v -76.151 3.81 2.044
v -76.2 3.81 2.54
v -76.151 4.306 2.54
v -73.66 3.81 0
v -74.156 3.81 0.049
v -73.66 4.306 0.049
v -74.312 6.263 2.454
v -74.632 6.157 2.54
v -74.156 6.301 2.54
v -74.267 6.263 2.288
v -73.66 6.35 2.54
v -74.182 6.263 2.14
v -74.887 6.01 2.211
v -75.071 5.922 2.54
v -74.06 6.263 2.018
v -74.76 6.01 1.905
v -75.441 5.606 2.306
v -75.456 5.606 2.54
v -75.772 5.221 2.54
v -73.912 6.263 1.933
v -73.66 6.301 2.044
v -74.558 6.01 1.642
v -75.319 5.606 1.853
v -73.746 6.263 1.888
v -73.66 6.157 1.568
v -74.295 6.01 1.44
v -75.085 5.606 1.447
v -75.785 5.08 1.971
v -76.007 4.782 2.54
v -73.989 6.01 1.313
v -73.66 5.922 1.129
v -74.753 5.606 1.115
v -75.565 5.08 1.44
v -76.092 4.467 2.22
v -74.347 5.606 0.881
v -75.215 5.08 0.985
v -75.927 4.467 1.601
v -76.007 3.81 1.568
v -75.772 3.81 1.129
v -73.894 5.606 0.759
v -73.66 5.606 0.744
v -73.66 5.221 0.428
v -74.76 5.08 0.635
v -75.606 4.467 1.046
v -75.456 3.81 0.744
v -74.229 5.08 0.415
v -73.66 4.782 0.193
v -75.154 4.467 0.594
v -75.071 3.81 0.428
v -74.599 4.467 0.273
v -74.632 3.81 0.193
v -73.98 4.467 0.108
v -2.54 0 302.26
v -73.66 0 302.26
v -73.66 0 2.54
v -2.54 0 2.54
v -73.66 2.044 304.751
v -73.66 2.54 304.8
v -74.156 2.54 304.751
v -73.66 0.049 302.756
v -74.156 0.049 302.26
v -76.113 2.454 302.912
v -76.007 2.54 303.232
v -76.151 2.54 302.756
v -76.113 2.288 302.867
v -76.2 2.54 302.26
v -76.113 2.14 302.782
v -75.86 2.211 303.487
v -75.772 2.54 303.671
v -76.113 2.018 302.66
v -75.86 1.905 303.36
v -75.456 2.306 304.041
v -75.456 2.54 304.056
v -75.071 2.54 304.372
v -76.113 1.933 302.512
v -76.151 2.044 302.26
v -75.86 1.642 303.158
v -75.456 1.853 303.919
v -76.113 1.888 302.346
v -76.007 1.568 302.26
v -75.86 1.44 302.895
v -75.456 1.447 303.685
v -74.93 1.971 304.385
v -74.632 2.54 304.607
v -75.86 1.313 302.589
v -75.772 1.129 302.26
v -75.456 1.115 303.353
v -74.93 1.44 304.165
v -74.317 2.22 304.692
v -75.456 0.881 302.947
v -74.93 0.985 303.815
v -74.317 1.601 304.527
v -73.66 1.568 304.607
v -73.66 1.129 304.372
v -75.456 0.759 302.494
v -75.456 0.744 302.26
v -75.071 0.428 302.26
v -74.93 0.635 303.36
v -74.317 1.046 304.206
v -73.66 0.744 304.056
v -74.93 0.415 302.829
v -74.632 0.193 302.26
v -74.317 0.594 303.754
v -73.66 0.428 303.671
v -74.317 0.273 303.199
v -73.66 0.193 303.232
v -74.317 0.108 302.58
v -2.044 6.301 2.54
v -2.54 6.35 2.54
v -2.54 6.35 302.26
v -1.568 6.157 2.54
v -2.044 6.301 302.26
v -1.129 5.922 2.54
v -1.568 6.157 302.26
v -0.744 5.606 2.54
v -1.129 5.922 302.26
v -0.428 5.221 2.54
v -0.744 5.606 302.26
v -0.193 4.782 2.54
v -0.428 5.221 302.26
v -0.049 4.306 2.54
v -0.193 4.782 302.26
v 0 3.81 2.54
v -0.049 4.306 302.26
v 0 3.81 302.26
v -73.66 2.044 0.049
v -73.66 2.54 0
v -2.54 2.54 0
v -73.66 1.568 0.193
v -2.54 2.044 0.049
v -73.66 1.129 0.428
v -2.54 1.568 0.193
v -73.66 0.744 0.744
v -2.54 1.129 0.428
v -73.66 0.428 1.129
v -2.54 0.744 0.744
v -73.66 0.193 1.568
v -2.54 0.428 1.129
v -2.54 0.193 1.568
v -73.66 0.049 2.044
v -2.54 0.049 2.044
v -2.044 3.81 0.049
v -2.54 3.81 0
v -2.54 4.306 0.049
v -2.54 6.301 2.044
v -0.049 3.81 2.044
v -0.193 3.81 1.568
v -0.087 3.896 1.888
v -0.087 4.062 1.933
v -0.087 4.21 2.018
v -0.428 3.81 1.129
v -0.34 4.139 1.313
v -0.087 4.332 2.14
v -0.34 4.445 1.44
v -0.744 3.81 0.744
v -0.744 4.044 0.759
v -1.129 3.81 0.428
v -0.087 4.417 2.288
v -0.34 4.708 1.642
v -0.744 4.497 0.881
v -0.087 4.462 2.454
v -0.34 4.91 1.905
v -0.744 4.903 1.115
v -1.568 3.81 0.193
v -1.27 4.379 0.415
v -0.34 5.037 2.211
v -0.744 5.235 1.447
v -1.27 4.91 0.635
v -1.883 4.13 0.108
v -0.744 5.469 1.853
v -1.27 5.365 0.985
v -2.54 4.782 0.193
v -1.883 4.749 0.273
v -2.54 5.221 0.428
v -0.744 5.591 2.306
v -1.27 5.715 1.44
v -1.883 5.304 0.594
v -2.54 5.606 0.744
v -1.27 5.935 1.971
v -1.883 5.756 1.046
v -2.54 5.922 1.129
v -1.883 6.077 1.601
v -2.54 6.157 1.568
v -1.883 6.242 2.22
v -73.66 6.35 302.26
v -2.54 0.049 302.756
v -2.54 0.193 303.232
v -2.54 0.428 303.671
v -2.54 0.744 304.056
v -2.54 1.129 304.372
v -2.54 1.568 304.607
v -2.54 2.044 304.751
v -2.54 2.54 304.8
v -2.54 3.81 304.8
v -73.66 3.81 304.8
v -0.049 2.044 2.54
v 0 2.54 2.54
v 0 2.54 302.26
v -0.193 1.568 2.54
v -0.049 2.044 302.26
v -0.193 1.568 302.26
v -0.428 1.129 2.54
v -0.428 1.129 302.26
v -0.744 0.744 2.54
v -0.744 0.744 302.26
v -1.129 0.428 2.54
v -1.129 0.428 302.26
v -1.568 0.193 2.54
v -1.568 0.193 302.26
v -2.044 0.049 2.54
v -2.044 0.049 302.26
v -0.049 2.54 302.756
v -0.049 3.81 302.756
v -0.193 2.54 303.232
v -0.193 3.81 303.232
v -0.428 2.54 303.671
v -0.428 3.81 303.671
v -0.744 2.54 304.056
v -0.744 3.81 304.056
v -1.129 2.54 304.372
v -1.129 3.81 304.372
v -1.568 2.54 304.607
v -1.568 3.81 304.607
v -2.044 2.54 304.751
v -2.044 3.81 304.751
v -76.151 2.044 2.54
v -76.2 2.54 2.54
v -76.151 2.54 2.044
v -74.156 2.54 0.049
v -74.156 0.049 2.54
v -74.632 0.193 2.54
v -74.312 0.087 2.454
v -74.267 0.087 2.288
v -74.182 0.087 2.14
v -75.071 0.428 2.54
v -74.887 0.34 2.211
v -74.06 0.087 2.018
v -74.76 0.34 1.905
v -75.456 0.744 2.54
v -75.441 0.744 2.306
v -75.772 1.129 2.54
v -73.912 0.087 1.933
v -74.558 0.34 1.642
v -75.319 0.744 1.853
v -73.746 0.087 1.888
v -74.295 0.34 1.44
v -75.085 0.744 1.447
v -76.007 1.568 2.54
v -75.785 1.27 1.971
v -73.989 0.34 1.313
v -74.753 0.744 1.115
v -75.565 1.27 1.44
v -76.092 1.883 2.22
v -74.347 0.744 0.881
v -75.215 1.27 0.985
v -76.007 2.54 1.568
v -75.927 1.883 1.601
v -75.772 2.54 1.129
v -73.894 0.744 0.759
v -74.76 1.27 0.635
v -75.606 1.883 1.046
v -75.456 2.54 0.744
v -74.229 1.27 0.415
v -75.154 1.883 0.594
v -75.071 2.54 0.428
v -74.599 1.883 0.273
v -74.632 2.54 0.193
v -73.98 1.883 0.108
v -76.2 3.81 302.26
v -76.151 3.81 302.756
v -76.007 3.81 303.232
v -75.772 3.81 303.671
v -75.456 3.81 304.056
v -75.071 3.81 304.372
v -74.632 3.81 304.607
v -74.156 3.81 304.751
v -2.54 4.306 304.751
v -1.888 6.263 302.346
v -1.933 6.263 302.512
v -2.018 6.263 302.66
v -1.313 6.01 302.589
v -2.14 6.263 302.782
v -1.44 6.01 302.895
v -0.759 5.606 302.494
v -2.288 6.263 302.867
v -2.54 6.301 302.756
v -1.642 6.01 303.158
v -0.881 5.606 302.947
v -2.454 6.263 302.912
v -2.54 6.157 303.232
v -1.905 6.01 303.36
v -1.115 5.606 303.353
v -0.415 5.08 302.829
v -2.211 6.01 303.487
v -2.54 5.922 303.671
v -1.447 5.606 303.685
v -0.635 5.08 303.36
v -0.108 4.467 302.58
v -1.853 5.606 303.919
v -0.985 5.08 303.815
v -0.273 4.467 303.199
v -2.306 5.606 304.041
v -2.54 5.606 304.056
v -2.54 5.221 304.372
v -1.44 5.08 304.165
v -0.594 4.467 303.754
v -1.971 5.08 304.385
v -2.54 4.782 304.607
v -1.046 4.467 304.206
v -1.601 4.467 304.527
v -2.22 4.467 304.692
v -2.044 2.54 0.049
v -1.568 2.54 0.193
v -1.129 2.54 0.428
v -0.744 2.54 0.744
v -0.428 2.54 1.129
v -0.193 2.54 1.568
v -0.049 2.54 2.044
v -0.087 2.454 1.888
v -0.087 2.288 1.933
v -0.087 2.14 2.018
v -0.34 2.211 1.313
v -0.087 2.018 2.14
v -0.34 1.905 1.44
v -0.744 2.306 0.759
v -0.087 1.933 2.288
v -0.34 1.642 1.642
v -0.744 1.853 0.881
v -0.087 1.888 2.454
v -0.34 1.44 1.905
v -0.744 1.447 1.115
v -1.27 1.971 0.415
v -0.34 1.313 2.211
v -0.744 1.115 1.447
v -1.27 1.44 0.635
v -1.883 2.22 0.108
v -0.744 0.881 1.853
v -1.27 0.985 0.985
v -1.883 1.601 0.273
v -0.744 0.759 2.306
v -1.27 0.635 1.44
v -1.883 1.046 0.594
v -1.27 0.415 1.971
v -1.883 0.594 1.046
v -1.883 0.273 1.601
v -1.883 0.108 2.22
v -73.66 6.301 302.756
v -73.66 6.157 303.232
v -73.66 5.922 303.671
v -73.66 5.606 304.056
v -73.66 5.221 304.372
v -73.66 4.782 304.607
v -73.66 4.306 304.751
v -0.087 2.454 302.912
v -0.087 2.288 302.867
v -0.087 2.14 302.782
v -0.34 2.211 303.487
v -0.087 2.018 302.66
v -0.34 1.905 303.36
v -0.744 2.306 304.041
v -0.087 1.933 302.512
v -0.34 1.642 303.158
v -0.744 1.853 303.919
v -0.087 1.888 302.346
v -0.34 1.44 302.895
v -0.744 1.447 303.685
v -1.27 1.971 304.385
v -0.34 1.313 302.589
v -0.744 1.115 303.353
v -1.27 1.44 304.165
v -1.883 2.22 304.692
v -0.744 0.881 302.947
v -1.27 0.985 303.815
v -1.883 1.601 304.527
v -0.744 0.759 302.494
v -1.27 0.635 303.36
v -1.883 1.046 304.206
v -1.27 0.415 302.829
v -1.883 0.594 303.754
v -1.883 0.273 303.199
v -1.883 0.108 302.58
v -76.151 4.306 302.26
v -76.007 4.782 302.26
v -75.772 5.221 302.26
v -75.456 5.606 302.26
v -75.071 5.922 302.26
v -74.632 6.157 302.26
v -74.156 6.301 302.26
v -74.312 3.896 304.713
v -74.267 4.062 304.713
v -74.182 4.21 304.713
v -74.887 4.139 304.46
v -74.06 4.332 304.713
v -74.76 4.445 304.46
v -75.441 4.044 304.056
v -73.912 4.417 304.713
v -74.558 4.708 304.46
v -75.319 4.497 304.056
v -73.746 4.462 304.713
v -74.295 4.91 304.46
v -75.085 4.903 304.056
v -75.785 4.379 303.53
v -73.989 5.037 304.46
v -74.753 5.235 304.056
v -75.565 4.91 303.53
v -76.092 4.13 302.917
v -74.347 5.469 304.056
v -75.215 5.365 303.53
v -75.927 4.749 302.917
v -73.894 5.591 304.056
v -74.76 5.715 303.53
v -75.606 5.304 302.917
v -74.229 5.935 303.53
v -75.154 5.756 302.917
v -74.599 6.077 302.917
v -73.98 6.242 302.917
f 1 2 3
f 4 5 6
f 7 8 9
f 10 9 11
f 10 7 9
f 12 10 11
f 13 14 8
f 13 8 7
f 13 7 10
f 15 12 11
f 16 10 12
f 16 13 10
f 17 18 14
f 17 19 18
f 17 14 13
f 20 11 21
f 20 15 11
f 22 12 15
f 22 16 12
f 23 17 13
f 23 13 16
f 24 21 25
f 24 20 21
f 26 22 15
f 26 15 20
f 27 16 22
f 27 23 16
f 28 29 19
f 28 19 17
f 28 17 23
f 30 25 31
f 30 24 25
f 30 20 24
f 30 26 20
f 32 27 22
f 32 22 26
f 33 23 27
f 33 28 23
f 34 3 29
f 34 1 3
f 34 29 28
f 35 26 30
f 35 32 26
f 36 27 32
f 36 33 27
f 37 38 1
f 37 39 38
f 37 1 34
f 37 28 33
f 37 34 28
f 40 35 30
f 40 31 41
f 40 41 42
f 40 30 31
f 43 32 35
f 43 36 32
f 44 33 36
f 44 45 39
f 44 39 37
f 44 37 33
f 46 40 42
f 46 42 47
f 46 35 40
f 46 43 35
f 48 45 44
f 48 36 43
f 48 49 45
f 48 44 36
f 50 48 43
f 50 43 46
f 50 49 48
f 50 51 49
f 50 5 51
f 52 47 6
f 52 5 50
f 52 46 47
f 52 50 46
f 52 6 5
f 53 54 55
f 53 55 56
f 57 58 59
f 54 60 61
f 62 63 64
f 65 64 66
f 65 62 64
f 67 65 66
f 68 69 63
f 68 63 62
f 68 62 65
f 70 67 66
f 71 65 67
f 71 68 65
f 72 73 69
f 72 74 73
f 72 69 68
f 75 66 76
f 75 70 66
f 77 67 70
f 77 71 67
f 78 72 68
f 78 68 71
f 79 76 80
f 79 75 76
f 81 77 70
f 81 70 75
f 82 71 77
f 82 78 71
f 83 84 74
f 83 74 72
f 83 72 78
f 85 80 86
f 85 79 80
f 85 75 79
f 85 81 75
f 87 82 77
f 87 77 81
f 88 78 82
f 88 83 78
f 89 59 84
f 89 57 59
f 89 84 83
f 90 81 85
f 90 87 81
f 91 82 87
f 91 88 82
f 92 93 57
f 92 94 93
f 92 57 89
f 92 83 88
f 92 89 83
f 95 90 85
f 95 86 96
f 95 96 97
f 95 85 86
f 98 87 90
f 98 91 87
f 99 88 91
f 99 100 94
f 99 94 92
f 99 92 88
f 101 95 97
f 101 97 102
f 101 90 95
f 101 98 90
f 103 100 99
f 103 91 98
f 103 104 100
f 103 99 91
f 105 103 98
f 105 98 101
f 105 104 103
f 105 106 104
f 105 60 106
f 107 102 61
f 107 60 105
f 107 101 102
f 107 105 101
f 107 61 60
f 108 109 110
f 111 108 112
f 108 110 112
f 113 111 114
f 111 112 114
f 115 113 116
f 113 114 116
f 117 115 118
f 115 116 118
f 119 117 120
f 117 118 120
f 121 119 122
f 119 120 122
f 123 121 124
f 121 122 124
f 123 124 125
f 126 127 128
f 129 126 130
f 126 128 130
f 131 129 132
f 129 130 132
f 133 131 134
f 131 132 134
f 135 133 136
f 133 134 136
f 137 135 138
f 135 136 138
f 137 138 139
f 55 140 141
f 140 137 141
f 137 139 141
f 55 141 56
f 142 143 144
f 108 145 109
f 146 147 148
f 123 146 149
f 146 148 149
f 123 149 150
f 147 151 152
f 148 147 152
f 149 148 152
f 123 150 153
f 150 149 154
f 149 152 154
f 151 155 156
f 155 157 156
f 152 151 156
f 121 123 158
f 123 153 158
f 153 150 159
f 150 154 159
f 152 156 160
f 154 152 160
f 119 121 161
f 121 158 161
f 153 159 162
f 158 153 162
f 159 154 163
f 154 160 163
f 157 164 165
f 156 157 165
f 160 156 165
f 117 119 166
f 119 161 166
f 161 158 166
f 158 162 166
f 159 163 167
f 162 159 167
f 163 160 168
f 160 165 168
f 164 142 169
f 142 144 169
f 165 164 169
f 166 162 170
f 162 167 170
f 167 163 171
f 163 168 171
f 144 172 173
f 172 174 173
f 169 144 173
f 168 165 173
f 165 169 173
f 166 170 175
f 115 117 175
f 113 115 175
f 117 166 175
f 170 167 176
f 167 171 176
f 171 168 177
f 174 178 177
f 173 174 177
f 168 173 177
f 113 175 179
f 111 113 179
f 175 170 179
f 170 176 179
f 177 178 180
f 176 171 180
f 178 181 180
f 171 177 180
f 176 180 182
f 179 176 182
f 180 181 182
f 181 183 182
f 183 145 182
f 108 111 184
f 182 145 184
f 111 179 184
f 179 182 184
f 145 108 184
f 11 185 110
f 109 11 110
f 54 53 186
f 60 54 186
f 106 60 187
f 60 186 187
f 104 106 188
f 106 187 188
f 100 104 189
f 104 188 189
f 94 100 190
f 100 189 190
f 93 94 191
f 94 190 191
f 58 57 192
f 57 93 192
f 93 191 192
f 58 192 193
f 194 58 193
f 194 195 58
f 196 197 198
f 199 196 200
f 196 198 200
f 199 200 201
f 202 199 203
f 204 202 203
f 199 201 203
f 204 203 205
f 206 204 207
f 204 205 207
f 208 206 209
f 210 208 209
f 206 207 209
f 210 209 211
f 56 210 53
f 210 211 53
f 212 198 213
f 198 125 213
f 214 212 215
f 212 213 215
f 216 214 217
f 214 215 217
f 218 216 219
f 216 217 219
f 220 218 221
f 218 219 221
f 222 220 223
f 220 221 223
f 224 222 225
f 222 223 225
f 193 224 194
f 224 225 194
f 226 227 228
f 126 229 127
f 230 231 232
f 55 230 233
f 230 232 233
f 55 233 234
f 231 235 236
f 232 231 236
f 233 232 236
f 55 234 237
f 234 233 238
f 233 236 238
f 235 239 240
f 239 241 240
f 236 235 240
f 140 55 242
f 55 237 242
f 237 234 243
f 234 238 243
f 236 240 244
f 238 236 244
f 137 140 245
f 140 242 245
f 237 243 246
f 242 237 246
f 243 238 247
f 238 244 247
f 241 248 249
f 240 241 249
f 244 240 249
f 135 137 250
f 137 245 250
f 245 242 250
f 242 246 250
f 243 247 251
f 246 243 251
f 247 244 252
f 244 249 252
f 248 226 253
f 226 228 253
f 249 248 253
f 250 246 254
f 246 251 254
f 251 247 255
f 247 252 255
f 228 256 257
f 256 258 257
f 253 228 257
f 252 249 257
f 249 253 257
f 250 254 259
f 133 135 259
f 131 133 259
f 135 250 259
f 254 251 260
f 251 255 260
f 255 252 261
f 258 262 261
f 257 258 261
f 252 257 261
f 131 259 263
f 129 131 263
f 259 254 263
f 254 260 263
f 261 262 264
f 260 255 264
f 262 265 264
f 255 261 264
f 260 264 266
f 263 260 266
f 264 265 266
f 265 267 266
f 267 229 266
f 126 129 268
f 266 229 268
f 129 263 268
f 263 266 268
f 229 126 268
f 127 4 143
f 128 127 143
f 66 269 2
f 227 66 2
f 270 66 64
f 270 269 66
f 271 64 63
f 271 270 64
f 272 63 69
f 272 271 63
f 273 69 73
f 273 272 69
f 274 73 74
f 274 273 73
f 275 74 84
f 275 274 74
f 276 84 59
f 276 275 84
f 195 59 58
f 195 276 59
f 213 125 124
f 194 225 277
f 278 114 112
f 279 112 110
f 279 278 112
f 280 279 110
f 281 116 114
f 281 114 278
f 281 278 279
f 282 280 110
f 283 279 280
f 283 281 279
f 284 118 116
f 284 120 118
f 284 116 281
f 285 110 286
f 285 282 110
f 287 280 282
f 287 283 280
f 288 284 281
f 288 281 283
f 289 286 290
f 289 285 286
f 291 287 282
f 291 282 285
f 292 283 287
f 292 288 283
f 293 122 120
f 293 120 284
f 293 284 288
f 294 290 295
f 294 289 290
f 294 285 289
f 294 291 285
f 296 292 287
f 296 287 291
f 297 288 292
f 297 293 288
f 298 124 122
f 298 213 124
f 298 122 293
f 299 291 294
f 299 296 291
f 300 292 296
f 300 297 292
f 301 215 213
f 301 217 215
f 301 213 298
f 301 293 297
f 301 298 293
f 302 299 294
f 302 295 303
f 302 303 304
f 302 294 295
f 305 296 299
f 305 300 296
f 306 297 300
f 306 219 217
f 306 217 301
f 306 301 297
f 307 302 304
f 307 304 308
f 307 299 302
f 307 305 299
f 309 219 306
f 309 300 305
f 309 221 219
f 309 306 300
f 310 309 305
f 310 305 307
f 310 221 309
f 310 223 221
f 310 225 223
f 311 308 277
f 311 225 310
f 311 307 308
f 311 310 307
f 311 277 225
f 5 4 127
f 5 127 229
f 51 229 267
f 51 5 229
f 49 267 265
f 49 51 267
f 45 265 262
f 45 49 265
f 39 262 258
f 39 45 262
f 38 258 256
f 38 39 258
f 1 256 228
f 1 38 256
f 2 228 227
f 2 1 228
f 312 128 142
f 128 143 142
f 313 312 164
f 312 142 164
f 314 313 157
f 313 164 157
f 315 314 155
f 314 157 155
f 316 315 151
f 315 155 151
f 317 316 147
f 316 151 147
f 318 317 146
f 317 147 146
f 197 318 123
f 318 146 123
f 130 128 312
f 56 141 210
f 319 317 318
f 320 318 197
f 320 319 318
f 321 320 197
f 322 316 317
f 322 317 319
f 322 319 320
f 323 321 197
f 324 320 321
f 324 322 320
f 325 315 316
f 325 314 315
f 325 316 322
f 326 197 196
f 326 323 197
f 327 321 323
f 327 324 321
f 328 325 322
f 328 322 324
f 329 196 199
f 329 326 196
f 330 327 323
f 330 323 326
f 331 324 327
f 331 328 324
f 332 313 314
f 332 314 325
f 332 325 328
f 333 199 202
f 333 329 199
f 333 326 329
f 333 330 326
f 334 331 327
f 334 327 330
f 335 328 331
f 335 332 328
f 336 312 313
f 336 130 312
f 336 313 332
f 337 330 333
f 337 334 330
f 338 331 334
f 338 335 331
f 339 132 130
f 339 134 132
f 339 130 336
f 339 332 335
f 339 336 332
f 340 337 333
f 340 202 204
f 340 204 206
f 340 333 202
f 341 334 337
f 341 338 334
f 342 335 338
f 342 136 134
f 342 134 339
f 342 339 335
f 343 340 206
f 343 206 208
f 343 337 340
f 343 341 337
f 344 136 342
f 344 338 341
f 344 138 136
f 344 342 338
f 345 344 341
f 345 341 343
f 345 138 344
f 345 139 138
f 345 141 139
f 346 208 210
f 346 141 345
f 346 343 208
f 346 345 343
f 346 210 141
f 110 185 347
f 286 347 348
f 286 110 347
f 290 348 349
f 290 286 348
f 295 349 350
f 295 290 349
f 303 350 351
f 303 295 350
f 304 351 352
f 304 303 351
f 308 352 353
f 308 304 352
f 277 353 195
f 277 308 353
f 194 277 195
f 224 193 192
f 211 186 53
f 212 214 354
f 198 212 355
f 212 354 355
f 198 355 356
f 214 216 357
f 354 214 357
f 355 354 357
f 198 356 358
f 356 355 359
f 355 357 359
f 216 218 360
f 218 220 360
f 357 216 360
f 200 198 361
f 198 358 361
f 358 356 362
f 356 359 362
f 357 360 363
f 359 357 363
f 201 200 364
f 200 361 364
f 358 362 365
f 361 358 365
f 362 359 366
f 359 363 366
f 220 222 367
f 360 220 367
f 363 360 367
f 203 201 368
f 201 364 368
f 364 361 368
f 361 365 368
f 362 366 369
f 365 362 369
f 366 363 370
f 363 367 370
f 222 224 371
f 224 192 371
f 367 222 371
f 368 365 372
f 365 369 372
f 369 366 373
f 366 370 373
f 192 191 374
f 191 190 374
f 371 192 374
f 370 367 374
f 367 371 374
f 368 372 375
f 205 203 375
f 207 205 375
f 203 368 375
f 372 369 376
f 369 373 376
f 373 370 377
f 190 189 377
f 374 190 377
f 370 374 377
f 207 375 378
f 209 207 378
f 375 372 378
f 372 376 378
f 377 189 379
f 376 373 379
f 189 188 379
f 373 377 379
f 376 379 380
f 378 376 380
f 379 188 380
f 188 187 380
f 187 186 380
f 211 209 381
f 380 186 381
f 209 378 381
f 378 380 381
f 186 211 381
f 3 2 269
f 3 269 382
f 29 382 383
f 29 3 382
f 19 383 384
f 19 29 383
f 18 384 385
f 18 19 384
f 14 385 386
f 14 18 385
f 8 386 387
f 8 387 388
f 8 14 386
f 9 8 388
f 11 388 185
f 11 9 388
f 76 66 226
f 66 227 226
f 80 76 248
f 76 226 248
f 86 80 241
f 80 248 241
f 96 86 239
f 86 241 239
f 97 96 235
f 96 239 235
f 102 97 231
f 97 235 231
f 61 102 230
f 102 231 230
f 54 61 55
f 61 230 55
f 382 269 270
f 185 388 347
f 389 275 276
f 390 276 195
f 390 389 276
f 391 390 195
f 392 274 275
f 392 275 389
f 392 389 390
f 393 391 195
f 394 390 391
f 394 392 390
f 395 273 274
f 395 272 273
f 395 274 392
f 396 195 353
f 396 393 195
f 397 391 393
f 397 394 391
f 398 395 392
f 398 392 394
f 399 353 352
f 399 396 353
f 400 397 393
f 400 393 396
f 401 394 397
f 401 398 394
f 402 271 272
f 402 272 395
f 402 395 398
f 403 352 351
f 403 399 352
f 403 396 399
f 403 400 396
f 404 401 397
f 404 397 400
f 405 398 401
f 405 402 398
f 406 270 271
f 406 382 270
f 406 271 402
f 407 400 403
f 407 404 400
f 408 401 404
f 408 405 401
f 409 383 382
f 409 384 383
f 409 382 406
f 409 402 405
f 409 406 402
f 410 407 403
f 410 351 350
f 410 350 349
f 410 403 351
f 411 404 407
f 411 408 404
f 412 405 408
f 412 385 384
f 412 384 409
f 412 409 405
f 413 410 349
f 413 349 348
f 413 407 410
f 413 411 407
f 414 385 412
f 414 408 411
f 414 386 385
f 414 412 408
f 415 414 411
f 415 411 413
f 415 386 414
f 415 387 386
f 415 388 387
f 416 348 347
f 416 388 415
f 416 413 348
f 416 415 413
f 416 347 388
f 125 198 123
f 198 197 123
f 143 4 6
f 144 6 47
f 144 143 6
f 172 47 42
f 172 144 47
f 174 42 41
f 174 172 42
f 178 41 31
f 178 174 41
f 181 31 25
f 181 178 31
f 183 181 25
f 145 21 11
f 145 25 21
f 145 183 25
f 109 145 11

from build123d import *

# Parameters (mm, degrees)
SKETCH1_W           = 254
SKETCH1_H           = 6.35
BOSS_EXTRUDE1_DEPTH = 304.8
CUT_EXTRUDE1_DEPTH  = 304.8
SKETCH4_W           = 181.607961477
SKETCH4_H           = 399.050444088
CUT_EXTRUDE2_DEPTH  = 397.811494919
FILLET2_R           = 2.54


with BuildPart() as part:
    # Sketch1 → Boss-Extrude1 (new body)
    with BuildSketch(Plane.XY):
        with Locations((-127, 3.175)):
            Rectangle(SKETCH1_W, SKETCH1_H)
    extrude(amount=BOSS_EXTRUDE1_DEPTH)

    # Sketch2 → Cut-Extrude1 (cut)
    with BuildSketch(Plane(origin=(0, 6.35, 0), x_dir=(1, 0, 0), z_dir=(0, 1, 0))):
        Polygon((-101.6, -304.8), (-254, 0), (-254, -304.8), align=None)
    extrude(amount=-CUT_EXTRUDE1_DEPTH, mode=Mode.SUBTRACT)

    # Sketch4 → Cut-Extrude2 (cut, through all)
    with BuildSketch(Plane(origin=(0, 6.35, 0), x_dir=(1, 0, 0), z_dir=(0, 1, 0))):
        with Locations((-167.003980738, -164.054917068)):
            Rectangle(SKETCH4_W, SKETCH4_H)
    extrude(amount=-CUT_EXTRUDE2_DEPTH, mode=Mode.SUBTRACT)

    # Fillet2
    fillet2_edges = [part.edges().sort_by_distance(p)[0] for p in [
        (-38.1, 0, 304.8),
        (-76.2, 3.175, 0),
        (-76.2, 6.35, 152.4),
        (-76.2, 3.175, 304.8),
        (-76.2, 0, 152.4),
        (0, 3.175, 304.8),
        (-38.1, 0, 0),
        (-38.1, 6.35, 0),
        (0, 3.175, 0),
        (0, 0, 152.4),
        (0, 6.35, 152.4),
        (-38.1, 6.35, 304.8),
    ]]
    fillet(fillet2_edges, radius=FILLET2_R)


solid = part.part
